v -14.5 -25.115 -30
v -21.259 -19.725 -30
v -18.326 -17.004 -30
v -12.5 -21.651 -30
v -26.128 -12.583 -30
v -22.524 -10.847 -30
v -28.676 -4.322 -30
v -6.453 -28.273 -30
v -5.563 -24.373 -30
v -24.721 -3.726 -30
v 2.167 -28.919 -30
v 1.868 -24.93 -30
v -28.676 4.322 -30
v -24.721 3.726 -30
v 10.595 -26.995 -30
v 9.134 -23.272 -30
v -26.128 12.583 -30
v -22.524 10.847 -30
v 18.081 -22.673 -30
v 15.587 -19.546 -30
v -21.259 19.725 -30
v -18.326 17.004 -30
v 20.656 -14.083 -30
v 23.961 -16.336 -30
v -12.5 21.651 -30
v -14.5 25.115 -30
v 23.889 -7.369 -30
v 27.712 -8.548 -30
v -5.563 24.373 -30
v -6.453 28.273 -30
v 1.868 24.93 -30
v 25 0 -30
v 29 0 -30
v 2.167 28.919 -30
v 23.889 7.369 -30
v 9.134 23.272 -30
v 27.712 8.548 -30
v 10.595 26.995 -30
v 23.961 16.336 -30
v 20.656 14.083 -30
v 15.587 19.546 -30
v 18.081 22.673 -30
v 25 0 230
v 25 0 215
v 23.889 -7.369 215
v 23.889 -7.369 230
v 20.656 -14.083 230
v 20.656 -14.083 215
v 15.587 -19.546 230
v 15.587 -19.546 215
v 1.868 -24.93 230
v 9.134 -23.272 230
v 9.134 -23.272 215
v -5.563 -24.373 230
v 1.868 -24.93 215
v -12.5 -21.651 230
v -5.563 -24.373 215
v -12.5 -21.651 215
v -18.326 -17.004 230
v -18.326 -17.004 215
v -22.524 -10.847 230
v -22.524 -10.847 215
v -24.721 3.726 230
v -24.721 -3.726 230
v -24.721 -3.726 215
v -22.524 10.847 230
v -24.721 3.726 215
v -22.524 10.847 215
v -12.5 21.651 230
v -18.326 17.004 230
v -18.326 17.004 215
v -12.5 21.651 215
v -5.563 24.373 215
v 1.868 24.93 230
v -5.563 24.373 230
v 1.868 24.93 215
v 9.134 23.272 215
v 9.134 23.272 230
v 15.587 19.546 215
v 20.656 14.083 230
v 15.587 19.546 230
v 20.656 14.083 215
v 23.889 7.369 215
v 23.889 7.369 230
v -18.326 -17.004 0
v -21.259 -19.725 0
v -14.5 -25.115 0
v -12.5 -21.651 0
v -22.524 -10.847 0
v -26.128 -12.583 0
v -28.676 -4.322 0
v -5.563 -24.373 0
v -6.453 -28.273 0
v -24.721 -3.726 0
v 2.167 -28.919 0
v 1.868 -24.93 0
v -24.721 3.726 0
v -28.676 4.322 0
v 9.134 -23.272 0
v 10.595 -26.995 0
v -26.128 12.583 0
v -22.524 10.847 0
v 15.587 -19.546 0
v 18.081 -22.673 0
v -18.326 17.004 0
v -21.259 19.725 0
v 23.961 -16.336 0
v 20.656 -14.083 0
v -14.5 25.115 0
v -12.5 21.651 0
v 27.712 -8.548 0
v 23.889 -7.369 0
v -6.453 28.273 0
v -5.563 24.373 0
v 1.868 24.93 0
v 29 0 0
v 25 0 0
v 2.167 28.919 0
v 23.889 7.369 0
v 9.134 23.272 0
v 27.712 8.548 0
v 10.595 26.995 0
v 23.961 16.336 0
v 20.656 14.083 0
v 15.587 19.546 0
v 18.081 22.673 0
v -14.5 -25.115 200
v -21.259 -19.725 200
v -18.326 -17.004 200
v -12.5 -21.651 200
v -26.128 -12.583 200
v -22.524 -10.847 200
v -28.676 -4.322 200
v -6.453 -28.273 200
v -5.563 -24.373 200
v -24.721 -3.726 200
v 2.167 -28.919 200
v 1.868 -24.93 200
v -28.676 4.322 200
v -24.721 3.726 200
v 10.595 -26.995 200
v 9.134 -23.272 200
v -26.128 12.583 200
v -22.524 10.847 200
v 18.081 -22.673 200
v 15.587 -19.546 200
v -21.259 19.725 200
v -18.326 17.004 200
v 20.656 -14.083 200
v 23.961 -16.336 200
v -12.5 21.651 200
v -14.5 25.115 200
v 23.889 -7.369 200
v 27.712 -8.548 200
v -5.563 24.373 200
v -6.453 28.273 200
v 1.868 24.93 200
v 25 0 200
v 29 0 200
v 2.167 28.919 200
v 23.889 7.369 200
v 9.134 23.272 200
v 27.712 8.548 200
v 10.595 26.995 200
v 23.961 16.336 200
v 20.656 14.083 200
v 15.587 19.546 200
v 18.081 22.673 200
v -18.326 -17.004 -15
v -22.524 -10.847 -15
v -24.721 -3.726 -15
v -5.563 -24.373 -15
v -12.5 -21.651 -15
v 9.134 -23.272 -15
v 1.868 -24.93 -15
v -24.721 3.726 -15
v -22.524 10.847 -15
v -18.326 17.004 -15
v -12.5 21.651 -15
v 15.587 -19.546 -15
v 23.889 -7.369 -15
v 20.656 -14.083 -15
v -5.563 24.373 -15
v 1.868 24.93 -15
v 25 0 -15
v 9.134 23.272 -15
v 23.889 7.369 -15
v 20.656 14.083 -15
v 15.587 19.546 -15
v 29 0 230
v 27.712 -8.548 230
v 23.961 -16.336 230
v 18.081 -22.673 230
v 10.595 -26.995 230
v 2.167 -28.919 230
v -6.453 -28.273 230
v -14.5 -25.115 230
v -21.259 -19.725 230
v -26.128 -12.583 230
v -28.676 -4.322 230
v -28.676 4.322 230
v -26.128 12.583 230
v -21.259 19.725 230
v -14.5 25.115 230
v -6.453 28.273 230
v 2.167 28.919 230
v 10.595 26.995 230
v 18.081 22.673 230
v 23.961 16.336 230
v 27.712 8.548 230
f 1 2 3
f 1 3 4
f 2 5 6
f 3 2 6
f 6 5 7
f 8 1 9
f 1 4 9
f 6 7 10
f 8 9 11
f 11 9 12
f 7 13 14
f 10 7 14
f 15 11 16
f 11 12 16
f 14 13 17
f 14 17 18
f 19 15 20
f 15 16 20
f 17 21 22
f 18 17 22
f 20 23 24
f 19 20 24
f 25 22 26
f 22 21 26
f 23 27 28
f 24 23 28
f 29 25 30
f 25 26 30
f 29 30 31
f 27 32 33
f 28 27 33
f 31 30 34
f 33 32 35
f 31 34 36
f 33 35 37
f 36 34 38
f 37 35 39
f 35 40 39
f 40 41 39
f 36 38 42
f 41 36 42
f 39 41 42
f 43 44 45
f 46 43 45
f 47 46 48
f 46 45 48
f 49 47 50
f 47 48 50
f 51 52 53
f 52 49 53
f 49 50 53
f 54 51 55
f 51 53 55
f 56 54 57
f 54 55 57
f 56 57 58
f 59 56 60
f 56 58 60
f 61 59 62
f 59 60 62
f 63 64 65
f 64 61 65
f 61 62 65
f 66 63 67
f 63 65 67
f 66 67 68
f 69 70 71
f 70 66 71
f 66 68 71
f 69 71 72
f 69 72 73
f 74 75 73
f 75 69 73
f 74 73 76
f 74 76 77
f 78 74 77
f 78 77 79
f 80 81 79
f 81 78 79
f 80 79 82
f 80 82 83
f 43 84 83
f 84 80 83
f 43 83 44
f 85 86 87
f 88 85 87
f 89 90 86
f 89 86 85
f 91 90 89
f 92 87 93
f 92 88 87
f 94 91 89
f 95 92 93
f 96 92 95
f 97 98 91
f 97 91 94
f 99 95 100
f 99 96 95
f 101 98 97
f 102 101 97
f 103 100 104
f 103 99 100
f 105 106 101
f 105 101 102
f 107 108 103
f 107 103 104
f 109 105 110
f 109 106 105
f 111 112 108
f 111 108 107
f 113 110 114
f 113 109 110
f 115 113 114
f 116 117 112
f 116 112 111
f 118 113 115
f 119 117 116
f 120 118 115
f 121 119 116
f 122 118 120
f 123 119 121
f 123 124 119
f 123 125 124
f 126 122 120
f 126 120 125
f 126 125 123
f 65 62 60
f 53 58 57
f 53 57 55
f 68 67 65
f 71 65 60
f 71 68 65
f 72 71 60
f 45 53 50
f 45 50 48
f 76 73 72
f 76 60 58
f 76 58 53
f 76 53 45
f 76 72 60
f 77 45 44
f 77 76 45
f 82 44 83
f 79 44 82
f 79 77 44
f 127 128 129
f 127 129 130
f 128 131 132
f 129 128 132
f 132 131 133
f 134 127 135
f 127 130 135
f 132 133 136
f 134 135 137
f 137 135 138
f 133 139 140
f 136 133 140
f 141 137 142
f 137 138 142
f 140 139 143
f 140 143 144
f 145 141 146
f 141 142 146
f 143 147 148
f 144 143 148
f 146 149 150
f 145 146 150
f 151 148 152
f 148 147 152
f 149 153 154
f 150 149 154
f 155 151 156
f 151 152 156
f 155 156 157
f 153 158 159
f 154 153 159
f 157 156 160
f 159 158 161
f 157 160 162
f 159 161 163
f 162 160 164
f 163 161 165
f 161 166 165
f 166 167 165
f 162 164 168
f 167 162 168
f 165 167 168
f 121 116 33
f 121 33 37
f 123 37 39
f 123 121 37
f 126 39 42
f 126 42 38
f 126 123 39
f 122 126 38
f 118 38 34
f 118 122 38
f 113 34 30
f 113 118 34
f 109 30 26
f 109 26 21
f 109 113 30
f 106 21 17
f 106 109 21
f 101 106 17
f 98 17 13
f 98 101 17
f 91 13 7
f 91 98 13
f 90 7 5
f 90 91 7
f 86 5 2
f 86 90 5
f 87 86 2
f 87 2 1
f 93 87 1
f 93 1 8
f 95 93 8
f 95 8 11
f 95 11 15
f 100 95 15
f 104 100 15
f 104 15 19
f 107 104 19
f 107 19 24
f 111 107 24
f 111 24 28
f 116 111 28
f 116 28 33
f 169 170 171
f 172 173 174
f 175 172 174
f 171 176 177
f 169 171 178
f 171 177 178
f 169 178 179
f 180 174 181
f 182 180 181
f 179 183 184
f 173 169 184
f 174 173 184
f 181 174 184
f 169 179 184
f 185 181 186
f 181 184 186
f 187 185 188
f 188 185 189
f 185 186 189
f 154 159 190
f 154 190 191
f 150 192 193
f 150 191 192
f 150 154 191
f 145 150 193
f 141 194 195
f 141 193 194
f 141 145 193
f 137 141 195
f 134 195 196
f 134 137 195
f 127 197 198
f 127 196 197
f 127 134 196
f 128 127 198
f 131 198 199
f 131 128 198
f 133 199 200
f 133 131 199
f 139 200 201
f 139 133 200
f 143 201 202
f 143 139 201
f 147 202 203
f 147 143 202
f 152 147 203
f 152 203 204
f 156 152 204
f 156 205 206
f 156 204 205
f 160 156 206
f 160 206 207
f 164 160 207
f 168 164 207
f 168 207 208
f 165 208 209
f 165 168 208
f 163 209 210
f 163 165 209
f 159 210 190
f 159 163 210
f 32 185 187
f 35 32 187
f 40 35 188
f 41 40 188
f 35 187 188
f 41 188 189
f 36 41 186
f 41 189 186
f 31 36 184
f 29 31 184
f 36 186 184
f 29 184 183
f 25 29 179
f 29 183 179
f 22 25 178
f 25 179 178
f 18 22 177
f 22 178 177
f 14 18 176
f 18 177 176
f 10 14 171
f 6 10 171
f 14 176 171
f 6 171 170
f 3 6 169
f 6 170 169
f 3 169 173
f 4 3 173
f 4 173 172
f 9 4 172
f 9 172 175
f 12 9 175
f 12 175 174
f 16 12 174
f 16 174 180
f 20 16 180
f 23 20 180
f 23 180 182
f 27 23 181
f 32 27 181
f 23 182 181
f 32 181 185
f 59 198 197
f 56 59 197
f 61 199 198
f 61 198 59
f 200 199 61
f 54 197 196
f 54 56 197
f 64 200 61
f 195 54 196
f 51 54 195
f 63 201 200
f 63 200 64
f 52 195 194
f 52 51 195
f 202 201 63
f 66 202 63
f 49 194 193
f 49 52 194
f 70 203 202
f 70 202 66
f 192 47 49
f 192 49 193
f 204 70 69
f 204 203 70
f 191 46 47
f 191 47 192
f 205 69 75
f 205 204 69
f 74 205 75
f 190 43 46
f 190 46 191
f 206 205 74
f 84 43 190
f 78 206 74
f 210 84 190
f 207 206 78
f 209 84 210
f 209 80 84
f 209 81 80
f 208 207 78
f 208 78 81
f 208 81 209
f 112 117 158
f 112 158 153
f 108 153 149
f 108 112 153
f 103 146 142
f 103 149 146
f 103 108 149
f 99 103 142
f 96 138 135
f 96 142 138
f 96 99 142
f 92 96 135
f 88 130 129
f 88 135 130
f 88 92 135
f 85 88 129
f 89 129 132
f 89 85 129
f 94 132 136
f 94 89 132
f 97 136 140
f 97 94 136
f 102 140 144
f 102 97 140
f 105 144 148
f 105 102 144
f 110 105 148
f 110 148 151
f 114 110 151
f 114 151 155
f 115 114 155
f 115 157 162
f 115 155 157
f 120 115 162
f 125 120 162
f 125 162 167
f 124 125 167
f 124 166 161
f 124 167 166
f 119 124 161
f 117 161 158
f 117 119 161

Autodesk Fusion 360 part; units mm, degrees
sketch "Sketch1" plane through (0, 0, 0) normal (0, 0, 1) x (1, 0, 0)
  circle A0 centre (0, 0) radius 25
  circle A1 centre (0, 0) radius 29
  dimension "d3" = 50
  dimension "d4" = 4
extrude "Extrude1" add sketch "Sketch1" along normal blind 200 contours A0 makes body 1
extrude "Extrude2" add sketch "Sketch1" against normal blind 30 separate body makes body 2
extrude "Extrude3" add sketch "Sketch1" against normal blind 15 contours A0 bodies 1 2
sketch "Sketch2" plane through (0, 0, 200) normal (0, 0, 1) x (1, 0, 0)
  circle A0 centre (0, 0) radius 25
  circle A1 centre (0, 0) radius 29
  dimension "d9" = 4
extrude "Extrude4" add sketch "Sketch2" along normal blind 15 contours A0 bodies 1
extrude "Extrude5" add sketch "Sketch2" along normal blind 30 bodies 1
